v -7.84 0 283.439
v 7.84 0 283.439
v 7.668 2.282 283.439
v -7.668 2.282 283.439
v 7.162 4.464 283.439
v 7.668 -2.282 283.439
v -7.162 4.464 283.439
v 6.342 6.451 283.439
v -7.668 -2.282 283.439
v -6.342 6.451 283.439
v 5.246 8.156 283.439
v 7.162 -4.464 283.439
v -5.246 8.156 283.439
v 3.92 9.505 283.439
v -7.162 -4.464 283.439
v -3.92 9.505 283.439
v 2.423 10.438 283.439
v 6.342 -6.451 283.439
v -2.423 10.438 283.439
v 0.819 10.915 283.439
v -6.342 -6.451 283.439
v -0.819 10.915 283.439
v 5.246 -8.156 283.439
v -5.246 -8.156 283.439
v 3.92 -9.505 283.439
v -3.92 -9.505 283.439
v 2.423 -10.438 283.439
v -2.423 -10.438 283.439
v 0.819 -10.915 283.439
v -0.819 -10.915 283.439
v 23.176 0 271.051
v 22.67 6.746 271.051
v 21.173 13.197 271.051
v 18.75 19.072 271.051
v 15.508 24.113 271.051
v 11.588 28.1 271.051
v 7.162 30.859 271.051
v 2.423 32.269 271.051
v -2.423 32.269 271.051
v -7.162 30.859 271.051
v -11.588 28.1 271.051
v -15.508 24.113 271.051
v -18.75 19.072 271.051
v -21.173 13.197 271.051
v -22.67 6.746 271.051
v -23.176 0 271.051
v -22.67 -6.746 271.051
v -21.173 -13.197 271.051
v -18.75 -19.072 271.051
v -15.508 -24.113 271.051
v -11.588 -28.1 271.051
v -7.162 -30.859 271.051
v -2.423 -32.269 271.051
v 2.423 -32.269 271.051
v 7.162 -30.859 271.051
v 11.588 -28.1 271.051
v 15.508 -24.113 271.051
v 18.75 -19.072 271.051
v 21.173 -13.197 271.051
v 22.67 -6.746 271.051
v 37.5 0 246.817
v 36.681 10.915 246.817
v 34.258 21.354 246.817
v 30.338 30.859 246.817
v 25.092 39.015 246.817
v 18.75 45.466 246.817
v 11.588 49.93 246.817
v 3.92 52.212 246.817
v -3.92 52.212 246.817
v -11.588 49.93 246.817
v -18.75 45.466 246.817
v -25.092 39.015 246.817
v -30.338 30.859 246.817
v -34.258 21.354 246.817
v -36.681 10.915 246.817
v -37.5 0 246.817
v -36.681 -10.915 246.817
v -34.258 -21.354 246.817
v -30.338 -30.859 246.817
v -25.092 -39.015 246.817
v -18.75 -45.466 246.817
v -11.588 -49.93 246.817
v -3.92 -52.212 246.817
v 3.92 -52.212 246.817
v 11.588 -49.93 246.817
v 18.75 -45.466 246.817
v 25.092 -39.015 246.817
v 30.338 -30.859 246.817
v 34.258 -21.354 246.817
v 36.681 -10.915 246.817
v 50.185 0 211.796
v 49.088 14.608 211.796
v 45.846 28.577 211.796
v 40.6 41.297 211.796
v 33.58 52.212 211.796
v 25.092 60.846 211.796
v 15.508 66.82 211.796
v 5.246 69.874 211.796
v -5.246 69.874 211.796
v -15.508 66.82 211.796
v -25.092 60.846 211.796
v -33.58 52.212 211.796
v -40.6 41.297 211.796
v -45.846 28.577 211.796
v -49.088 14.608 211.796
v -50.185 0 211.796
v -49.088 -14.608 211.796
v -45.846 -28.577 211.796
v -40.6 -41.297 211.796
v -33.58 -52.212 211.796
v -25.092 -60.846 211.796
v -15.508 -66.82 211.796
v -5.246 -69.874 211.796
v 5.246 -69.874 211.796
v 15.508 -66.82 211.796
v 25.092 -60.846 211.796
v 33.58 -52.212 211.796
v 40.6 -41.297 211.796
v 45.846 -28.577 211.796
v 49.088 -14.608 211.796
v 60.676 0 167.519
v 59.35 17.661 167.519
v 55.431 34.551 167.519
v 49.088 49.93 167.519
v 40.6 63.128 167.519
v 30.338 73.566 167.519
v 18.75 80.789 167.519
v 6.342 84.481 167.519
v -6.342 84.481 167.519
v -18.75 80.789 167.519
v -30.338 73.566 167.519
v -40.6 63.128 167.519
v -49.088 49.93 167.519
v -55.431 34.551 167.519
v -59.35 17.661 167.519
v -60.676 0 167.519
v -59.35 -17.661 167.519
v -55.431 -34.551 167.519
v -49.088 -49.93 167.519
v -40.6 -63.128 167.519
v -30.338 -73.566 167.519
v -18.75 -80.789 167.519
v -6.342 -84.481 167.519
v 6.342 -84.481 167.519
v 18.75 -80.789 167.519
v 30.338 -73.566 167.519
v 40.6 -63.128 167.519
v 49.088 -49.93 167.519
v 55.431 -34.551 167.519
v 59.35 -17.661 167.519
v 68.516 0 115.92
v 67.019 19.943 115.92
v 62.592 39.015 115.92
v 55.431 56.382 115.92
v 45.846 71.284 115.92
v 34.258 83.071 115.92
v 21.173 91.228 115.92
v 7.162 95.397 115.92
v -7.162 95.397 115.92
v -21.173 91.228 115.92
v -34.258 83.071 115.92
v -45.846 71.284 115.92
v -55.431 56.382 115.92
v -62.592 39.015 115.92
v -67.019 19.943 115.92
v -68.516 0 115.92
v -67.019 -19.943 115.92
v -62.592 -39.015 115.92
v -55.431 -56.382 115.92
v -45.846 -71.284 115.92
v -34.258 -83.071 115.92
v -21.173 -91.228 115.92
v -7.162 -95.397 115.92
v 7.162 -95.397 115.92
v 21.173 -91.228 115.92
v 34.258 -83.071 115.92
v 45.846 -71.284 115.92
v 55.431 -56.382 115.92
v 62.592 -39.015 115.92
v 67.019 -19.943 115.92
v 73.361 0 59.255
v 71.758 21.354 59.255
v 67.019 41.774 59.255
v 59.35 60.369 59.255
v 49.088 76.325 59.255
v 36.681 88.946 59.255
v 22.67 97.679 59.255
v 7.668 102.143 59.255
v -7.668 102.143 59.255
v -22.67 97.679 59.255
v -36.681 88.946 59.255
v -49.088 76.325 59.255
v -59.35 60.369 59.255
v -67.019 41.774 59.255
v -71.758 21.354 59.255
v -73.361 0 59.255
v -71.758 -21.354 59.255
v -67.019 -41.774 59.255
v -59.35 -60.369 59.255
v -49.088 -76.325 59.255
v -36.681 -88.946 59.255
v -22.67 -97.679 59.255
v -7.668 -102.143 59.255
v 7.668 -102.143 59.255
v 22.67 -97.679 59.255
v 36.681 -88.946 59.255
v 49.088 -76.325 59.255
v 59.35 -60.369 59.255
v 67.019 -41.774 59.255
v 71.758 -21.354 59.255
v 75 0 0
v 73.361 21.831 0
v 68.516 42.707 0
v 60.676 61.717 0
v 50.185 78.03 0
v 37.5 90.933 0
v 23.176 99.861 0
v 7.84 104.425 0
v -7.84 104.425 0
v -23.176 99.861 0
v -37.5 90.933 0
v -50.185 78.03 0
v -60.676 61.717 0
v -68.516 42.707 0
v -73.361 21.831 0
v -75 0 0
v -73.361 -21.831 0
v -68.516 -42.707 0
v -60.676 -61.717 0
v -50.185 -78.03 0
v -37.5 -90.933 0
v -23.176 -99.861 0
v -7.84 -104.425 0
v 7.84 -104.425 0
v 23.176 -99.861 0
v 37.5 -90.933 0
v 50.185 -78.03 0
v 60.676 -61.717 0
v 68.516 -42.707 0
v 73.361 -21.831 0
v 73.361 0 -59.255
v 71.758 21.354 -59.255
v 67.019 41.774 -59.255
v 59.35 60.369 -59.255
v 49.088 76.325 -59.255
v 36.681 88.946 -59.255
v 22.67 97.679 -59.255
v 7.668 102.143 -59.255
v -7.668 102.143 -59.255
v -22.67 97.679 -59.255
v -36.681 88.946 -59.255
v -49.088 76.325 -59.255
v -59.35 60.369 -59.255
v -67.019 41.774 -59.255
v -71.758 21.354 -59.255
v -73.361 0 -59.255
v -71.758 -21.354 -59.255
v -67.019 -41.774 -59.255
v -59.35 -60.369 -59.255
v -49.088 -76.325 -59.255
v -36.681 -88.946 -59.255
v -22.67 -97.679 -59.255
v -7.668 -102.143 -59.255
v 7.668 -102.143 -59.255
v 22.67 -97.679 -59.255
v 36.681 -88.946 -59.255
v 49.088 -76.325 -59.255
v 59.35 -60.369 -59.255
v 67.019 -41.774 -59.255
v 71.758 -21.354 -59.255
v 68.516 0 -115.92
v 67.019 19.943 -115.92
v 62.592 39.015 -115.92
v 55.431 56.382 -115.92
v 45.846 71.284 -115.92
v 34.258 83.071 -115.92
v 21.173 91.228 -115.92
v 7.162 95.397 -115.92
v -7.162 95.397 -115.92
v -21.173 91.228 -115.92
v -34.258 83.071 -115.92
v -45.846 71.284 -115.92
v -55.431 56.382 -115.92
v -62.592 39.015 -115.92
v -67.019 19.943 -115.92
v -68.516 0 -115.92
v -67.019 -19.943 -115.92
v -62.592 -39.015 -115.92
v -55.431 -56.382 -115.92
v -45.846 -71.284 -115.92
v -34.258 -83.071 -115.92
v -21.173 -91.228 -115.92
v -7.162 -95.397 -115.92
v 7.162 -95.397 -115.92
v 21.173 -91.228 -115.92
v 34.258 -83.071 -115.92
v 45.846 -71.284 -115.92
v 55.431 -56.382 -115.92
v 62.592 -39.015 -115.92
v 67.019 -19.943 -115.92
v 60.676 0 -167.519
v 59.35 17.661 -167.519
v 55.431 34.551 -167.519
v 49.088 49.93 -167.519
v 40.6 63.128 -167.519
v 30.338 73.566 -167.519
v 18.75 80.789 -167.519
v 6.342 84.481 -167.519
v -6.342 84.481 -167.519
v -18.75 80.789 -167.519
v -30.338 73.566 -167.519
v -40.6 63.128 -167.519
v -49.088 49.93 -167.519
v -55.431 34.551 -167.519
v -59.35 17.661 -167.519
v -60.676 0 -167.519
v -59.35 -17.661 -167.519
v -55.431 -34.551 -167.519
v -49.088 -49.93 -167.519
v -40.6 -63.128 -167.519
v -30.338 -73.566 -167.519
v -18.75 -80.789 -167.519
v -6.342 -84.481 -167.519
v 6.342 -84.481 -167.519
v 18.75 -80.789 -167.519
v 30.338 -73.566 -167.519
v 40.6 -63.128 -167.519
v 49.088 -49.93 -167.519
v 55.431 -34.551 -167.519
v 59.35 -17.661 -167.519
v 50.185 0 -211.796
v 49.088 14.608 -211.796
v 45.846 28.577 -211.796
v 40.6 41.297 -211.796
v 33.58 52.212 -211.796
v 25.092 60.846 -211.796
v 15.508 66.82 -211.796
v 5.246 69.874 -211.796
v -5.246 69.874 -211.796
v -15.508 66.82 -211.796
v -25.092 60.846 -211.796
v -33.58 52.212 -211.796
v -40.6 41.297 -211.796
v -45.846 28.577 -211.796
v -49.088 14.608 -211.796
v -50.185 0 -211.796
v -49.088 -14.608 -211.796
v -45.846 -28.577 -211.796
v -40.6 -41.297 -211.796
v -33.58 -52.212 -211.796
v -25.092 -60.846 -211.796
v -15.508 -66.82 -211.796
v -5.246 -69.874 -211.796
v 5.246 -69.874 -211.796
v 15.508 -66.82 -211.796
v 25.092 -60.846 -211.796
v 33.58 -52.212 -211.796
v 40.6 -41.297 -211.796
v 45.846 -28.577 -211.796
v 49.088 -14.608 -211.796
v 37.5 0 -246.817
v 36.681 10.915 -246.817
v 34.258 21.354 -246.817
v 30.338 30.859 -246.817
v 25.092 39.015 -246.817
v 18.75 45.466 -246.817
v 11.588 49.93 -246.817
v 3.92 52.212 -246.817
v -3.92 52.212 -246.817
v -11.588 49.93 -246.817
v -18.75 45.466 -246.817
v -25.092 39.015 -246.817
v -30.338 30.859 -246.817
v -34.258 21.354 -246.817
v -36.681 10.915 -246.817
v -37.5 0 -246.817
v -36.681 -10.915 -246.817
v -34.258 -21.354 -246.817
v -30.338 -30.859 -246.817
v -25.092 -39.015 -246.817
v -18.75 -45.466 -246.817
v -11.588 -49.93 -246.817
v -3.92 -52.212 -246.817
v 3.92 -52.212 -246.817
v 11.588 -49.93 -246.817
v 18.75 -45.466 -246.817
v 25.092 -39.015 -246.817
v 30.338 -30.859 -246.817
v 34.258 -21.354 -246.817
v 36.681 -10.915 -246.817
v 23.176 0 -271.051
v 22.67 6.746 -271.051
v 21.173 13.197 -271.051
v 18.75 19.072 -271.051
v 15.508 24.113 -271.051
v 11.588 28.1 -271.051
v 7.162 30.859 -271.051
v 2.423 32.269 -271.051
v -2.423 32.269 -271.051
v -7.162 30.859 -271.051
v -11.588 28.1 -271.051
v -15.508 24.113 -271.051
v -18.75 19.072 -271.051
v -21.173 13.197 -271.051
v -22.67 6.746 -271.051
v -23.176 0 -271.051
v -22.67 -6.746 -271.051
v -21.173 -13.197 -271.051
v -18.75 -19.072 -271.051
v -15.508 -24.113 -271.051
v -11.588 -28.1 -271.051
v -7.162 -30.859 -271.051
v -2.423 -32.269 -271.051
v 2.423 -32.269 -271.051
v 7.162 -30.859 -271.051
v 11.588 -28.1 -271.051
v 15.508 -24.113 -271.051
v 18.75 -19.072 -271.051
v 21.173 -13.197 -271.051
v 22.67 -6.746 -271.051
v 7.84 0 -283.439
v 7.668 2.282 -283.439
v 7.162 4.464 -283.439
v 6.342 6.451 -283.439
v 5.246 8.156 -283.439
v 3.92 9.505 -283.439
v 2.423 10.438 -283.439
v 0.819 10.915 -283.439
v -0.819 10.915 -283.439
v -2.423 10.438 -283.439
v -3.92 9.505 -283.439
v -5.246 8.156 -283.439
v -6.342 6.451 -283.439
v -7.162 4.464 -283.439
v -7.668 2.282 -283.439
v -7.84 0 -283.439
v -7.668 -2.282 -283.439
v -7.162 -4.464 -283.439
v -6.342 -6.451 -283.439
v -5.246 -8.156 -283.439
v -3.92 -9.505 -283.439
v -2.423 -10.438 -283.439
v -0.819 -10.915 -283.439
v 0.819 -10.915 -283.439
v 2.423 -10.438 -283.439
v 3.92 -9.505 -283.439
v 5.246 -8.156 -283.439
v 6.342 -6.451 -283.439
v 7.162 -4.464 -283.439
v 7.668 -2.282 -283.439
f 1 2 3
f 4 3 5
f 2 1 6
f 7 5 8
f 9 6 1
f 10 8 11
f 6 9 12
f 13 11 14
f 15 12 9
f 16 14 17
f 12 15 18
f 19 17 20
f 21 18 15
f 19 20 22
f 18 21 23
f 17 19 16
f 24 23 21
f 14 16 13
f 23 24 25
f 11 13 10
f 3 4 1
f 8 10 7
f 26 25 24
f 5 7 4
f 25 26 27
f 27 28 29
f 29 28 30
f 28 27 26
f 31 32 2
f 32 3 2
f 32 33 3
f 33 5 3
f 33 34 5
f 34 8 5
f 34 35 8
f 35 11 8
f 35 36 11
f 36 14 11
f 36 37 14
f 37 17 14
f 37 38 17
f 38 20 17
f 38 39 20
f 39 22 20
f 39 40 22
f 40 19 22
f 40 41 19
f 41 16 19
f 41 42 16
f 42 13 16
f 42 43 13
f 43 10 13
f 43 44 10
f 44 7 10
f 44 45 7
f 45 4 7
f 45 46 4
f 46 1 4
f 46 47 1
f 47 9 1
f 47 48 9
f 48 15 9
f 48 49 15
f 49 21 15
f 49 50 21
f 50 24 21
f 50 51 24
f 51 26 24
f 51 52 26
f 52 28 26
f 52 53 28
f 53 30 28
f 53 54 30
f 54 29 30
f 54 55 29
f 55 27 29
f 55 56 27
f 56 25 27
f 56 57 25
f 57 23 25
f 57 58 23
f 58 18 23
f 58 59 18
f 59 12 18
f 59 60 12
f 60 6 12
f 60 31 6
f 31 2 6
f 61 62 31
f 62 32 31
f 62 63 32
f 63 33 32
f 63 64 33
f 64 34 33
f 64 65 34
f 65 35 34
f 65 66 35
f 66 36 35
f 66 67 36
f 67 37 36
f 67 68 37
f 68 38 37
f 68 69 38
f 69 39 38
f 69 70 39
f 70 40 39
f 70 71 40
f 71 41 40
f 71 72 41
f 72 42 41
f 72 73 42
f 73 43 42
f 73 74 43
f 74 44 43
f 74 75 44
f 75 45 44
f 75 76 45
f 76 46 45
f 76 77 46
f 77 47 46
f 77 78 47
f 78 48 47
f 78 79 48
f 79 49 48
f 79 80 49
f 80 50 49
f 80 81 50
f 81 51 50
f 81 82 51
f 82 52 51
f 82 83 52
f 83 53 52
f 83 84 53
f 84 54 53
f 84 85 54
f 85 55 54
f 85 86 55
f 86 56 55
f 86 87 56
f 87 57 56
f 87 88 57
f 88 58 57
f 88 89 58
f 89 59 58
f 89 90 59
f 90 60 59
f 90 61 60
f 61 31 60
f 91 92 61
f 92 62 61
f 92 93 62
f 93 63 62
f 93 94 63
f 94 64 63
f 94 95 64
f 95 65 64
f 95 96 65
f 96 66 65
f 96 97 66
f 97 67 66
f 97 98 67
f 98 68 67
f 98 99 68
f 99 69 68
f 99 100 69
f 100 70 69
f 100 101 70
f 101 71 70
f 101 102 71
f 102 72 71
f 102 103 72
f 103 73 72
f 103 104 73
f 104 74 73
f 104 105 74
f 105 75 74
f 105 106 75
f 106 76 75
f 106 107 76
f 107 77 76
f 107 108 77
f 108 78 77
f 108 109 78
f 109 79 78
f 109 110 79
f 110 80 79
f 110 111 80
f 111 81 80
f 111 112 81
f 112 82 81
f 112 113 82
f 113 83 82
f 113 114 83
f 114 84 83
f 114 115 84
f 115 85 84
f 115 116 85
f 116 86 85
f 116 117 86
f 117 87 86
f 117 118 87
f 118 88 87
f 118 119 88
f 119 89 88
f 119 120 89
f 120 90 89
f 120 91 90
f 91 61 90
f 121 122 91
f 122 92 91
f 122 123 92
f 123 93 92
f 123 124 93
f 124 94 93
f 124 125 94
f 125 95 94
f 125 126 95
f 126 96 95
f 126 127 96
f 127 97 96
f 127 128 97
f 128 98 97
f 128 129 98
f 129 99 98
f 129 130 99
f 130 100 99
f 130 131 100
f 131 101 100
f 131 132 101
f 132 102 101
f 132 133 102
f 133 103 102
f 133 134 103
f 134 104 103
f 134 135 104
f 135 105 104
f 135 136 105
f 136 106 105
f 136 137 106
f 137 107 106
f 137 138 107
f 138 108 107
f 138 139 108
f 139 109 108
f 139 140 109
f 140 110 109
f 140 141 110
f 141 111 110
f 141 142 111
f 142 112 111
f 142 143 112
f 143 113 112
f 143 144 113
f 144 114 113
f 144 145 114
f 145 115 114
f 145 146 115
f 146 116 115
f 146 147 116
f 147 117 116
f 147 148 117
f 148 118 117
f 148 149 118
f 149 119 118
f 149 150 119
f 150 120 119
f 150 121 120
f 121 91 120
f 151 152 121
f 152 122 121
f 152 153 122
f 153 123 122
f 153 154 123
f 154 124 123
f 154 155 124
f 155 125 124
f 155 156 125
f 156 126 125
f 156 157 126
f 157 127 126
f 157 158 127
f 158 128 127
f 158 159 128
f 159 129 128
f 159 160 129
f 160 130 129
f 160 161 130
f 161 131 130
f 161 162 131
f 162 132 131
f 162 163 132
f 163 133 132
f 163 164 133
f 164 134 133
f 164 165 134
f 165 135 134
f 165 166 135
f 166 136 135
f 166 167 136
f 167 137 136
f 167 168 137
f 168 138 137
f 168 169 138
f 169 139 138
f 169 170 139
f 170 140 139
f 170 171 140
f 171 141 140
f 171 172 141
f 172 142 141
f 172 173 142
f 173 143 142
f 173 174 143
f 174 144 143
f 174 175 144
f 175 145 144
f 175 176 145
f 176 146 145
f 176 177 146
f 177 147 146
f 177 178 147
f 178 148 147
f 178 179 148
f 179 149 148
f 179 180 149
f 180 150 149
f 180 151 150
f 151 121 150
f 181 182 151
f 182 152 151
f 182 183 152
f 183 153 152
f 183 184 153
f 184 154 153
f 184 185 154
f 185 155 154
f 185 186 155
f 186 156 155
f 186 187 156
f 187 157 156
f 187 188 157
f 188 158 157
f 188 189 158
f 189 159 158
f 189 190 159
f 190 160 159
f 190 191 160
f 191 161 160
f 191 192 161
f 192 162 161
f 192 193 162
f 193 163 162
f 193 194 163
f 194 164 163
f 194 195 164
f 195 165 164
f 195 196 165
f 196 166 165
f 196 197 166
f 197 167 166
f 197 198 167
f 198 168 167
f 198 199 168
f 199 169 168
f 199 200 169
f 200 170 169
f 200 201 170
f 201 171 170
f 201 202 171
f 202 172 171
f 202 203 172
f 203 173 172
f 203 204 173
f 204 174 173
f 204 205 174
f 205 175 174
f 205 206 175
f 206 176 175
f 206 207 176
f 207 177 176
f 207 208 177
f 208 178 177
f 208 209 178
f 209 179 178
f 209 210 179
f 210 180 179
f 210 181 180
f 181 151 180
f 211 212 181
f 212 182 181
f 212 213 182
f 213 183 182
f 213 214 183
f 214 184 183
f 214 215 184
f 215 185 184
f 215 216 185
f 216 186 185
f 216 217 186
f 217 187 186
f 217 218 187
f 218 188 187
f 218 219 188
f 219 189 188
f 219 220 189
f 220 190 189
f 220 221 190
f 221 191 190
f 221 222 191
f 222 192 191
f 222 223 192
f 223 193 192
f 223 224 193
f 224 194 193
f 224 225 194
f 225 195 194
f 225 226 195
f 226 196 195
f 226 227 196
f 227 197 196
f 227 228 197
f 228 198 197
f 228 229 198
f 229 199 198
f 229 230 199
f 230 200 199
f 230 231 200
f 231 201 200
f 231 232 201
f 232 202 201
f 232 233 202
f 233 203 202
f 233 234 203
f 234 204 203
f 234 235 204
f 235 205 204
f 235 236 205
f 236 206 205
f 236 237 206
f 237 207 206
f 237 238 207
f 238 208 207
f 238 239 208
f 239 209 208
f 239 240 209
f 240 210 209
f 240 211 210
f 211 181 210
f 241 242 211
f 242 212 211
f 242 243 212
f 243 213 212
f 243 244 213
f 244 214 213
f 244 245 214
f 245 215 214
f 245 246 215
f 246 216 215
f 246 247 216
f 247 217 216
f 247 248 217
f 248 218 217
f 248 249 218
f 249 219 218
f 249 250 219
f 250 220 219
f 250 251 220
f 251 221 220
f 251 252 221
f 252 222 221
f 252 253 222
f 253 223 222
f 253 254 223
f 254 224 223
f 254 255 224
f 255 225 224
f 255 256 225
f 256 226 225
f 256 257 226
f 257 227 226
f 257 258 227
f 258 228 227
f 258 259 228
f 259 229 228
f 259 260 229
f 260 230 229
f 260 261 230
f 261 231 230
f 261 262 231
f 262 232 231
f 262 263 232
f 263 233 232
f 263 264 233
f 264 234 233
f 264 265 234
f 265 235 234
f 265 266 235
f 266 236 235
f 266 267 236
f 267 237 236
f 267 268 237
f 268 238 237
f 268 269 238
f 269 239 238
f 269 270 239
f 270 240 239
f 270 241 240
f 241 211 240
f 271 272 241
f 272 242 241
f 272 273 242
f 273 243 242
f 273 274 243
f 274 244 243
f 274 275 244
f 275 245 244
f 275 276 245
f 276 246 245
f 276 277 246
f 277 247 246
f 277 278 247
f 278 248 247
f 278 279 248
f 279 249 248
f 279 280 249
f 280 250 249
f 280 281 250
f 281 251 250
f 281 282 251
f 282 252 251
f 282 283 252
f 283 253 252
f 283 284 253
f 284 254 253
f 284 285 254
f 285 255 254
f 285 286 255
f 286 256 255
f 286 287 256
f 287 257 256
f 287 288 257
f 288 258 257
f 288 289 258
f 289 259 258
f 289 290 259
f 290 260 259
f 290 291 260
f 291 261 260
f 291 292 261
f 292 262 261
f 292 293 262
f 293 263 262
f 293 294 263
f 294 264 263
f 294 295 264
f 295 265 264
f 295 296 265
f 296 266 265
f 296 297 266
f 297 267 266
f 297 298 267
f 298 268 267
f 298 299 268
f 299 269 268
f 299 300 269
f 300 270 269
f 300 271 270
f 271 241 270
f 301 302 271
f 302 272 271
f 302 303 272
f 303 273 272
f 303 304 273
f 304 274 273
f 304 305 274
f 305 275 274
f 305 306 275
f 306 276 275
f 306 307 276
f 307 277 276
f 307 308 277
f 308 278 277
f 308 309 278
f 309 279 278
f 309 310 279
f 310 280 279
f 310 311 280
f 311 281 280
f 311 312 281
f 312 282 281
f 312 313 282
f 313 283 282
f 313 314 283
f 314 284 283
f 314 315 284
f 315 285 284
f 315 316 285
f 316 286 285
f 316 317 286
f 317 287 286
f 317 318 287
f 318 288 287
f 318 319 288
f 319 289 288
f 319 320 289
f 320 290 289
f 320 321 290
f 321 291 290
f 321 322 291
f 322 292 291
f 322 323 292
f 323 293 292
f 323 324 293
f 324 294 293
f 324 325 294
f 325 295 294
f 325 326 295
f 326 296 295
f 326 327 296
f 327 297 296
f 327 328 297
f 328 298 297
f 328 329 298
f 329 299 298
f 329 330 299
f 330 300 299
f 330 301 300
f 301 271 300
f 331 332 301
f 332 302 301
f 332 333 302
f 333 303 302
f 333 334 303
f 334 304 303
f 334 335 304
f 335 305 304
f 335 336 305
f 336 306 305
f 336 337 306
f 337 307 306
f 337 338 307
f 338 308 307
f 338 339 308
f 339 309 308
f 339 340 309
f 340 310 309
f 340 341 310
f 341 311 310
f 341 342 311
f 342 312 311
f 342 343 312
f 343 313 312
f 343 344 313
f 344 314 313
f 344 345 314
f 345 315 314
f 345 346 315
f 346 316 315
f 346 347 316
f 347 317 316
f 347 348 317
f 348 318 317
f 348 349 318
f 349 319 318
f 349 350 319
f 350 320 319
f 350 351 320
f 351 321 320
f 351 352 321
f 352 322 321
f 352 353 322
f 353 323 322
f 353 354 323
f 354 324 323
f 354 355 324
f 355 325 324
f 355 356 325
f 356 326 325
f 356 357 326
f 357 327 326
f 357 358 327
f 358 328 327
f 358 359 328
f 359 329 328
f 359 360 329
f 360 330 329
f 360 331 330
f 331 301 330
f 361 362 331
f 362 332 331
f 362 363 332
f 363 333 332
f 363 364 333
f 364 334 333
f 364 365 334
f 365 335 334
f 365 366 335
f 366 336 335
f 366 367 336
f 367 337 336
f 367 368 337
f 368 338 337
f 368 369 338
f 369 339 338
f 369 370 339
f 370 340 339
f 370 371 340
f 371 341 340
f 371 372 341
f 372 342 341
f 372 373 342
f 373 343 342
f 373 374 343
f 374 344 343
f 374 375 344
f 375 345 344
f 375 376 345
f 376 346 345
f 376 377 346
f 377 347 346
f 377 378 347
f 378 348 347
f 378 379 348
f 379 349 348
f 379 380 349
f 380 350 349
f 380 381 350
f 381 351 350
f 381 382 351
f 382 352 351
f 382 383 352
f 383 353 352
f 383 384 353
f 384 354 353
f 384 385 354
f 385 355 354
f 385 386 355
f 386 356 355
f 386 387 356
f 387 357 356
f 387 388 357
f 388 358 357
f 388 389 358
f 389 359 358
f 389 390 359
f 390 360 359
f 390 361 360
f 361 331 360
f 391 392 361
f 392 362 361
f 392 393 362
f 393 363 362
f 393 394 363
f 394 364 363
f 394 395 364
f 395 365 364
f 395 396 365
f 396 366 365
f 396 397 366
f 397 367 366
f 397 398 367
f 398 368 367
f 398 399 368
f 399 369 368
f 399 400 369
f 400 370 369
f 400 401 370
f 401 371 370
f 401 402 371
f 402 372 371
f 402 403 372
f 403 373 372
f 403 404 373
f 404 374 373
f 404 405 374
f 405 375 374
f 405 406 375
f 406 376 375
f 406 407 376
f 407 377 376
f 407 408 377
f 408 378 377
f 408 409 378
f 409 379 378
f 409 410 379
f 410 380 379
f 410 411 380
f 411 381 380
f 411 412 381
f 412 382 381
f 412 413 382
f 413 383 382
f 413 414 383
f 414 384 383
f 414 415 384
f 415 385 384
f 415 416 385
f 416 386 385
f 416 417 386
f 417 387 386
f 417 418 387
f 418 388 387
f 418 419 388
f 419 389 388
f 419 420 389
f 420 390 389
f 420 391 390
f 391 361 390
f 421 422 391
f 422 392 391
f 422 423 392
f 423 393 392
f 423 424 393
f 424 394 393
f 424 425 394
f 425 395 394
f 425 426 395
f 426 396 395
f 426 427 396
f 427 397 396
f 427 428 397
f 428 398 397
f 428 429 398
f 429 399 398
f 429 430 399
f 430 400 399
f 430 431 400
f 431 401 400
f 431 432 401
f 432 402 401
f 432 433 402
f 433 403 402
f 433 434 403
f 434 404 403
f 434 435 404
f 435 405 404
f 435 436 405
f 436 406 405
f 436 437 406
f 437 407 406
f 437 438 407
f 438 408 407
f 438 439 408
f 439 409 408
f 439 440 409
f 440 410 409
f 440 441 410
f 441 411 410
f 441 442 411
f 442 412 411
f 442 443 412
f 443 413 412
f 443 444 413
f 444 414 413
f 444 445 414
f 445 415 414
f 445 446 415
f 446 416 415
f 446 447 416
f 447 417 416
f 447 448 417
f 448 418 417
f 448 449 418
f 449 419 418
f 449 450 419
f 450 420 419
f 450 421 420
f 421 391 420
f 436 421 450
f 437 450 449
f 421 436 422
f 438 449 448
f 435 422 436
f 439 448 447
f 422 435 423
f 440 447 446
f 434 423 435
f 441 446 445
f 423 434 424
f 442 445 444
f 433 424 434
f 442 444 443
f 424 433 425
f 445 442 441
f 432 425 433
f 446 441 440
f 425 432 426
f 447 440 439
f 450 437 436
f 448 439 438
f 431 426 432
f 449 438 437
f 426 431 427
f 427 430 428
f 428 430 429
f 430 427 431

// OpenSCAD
// Generated by SolidPython 1.0.1 on 2020-07-29 00:46:46


scale(v = [5, 7, 19]) {
	sphere(r = 15);
}
/***********************************************
*********      SolidPython code:      **********
************************************************
 
# import packages: SolidPython
from solid import *
from solid.utils import *
from itertools import chain, combinations, permutations


class Resize:

    def __init__(self, scad_file):
        self.scad_file = scad_file
        #self.scad_file = import_scad(scad_file)
        # cone/cylinder param:
        self.r1 = 0
        self.r2 = 0
        self.h = 0
        # rectangular prism param:
        self.w = 0
        self.l = 0
        # ellipse param:
        self.r = 0

    # import OpenScad code (file name corresponds to shape)


    # classify shape + parameters
    def assign(self, param1, param2, param3):
        if self.scad_file == 'cone.scad':
            self.r1 = param1
            self.r2 = param2
            self.h = param3
        elif self.scad_file == 'cylinder.scad':
            self.r1 = param1
            self.r2 = param2
            self.h = param3
        elif self.scad_file == 'rectangularPrism.scad':
            self.h = param1
            self.l = param2
            self.w = param3
        else:
            self.r = param1
            self.h = param2

    # resize parameters
    def iterate(self):
        x = range(3, 20, 2)
        i = 1
        if self.scad_file == 'cone.scad':
            tempList = list(permutations(x, 2))
            for temp in tempList:
                param1 = temp[0]
                param2 = temp[1]
                filepath = 'produced_scad_files/' + 'cone' + str(param1) + '_' + str(param2) + '_' + '.scad'
                scad_render_to_file(cylinder(h=param1, r1=param2, r2=0), filepath)

        elif self.scad_file == 'cylinder.scad':
            tempList = list(permutations(x, 3))
            for temp in tempList:
                param1 = temp[0]
                param2 = temp[1]
                filepath = 'produced_scad_files/' + 'cylinder' + str(param1) + '_' + str(param2) + '_' + '.scad'
                scad_render_to_file(cylinder(h=param1, r1=param2, r2=param2), filepath)

        elif self.scad_file == 'rectangularPrism.scad':
            tempList = list(permutations(x, 3))
            for temp in tempList:
                param1 = temp[0]
                param2 = temp[1]
                param3 = temp[2]
                filepath = 'produced_scad_files/' + 'rectangularPrism' + str(param1) + '_' + str(param2) + '_' + str(
                    param3) + '.scad'
                scad_render_to_file(cube(size=(param1, param2, param3)), filepath)

        elif self.scad_file == 'ellipse.scad':
            tempList = list(permutations(x, 4))
            for temp in tempList:
                param1 = temp[0]
                param2 = temp[1]
                param3 = temp[2]
                param4 = temp[3]
                filepath = 'produced_scad_files/' + 'ellipse' + str(param1) + '_' + str(param2) + '_' + str(param3) + '_' + str(param4) + '.scad'
                scad_render_to_file(scale([param1, param2, param3])(sphere(r=param4)), filepath)

    def render_to_scadfile(self):
        scad_render_to_file(scad, 'example.scad') 
 
************************************************/
